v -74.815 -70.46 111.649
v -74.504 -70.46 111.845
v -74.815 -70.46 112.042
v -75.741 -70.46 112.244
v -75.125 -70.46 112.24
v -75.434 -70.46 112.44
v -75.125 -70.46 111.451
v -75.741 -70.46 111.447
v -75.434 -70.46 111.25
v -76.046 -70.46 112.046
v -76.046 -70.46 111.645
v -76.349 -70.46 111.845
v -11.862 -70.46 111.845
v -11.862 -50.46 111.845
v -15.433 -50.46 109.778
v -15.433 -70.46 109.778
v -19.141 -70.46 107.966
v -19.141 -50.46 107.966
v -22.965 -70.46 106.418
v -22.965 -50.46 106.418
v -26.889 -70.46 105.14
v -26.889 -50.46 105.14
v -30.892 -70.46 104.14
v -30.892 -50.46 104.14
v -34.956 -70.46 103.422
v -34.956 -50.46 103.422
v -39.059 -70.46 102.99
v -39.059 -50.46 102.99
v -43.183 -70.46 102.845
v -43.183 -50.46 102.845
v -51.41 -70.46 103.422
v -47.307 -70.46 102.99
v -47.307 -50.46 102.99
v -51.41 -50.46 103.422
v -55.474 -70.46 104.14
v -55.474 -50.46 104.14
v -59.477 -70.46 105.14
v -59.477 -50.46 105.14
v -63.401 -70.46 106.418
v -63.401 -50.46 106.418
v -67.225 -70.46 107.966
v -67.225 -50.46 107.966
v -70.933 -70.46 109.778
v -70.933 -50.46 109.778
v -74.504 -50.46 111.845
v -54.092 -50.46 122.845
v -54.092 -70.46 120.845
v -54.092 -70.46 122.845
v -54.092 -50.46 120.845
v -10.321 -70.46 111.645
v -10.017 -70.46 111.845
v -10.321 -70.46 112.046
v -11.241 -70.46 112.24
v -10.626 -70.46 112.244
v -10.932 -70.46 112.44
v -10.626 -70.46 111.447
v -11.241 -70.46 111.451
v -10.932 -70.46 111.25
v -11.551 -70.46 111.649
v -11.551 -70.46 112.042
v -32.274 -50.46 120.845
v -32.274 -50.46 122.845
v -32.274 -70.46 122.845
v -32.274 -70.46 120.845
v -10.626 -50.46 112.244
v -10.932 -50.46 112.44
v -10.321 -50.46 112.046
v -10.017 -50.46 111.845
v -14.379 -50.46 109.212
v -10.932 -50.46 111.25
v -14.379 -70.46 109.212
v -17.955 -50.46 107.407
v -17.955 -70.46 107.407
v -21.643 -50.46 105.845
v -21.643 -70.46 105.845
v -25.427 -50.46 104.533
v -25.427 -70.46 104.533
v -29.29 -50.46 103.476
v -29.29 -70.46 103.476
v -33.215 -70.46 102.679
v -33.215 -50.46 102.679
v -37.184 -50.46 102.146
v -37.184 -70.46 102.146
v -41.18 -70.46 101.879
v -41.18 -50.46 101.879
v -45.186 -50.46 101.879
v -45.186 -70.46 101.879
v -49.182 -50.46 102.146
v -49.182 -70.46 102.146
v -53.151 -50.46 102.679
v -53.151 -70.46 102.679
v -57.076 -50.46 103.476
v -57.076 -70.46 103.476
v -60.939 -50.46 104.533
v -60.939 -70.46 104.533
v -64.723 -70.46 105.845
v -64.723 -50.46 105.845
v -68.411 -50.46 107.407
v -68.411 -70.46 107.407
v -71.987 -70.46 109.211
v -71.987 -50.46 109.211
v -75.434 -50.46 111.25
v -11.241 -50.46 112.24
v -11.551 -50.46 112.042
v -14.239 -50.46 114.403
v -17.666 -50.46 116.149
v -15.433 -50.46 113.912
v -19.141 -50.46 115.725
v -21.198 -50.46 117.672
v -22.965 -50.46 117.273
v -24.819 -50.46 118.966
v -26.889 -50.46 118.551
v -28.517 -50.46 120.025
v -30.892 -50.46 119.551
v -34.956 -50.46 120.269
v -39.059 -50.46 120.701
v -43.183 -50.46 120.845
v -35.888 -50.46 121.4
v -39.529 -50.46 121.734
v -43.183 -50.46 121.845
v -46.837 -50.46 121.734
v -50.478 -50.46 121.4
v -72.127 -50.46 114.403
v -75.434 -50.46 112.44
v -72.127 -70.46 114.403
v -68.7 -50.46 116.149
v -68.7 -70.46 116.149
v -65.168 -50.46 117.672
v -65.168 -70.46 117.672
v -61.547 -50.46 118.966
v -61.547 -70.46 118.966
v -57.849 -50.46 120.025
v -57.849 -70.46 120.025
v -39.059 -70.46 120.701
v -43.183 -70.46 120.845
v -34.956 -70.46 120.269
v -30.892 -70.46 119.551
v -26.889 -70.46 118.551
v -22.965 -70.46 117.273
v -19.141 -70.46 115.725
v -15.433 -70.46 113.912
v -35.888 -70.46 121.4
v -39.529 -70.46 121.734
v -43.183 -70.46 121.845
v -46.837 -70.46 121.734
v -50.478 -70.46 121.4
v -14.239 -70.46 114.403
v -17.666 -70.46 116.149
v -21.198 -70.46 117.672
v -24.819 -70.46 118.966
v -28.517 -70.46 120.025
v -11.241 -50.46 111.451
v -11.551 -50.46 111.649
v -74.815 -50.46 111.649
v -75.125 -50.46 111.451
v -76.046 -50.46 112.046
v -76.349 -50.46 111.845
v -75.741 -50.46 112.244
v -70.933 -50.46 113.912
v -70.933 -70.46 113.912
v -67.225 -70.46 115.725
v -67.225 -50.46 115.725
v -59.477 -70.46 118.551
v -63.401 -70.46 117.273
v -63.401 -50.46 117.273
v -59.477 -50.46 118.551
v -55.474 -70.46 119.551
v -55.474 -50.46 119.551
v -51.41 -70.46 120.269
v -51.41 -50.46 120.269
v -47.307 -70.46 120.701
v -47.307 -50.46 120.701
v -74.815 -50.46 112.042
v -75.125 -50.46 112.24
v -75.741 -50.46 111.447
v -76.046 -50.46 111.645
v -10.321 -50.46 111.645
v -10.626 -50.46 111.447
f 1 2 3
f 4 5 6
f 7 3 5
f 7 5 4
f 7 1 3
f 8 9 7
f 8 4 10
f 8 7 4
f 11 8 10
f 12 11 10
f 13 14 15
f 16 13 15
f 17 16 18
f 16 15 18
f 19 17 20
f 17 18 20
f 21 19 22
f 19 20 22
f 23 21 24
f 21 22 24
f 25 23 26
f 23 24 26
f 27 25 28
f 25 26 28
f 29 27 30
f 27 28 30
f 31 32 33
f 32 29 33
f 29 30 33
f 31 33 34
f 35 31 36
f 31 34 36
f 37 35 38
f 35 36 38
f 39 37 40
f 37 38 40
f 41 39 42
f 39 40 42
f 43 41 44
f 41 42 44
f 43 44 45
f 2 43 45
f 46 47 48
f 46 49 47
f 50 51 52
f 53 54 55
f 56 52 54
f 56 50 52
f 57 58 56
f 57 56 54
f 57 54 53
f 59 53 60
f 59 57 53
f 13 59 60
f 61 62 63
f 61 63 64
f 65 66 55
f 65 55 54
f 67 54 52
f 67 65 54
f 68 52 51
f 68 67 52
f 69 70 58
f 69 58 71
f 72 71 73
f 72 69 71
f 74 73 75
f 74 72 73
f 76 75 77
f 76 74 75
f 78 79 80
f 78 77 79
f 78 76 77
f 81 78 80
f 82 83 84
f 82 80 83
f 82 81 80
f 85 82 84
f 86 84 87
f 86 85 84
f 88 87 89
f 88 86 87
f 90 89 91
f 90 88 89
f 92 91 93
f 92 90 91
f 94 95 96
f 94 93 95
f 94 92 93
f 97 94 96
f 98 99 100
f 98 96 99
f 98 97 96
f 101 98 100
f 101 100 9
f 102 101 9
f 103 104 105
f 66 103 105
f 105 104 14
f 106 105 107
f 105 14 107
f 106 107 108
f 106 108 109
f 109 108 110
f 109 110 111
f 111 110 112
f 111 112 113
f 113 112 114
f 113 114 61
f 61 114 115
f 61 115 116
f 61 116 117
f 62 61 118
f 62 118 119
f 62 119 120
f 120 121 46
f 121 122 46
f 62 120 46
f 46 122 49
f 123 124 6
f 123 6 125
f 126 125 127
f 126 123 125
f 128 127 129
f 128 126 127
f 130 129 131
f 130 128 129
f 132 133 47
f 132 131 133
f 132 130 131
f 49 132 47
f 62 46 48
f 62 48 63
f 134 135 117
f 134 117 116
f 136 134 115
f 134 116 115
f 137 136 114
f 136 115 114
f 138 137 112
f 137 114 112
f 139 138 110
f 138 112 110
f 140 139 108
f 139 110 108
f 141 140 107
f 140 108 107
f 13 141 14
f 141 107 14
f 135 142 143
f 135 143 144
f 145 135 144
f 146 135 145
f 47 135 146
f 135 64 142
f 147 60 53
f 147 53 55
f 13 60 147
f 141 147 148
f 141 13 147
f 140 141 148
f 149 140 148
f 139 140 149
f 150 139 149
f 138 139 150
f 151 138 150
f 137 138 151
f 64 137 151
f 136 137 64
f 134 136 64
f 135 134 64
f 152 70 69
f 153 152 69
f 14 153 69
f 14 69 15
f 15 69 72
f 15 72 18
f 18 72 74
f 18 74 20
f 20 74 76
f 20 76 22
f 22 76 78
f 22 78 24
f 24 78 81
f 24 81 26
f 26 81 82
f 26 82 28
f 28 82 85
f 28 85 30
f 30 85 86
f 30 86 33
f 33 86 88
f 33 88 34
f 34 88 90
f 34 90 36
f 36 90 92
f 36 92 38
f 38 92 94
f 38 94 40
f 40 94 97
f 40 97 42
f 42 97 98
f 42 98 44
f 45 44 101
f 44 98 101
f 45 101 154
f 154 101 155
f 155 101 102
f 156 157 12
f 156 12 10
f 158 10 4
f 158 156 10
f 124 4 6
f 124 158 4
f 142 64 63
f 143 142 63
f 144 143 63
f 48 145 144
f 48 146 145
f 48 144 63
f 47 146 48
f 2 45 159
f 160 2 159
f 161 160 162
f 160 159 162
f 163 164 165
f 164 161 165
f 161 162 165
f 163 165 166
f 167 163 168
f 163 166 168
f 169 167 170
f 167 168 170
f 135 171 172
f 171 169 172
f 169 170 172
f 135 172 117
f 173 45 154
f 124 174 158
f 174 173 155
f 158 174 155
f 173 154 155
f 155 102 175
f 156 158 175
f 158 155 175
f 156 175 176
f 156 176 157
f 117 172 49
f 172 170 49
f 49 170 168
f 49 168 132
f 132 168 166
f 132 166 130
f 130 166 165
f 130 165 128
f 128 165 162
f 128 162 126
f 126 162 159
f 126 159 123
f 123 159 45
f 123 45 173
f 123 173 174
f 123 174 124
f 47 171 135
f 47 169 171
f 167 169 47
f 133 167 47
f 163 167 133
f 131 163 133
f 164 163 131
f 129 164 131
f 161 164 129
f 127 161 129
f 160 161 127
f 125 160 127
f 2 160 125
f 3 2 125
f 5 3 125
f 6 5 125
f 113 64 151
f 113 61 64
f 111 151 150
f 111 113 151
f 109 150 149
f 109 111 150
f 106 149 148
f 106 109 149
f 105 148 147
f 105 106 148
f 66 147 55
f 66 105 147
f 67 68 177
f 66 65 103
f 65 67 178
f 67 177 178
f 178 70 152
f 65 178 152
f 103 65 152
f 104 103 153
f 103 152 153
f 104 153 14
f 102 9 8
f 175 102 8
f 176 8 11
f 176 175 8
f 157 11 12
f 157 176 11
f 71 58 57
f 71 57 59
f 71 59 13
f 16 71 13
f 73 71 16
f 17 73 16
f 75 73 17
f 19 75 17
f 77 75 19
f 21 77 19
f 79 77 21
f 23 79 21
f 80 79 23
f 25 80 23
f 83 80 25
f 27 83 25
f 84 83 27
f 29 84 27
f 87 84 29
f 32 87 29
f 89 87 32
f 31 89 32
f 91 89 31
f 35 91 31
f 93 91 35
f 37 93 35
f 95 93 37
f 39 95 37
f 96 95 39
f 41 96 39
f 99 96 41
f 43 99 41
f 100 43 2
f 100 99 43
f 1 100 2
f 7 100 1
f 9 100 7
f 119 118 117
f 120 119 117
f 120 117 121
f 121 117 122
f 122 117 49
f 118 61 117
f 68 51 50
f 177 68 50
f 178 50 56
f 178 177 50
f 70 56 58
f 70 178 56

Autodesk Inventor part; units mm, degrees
ref_plane "YZ Plane" through (0, 0, 0) normal (1, 0, 0) x (0, 1, 0)
ref_plane "XZ Plane" through (0, 0, 0) normal (0, 1, 0) x (-1, 0, 0)
ref_plane "XY Plane" through (0, 0, 0) normal (0, 0, 1) x (1, 0, 0)
ref_plane "Arbeitsebene1" through (-23.7843, -50.4597, 67.3862) normal (0, -1, 0) x (-1, 0, 0)
sketch "Skizze1" plane through (-23.7843, -50.4597, 67.3862) normal (0, -1, 0) x (-1, 0, 0)
  arc A0 (-13.7675, -44.4592) -> (52.565, -44.4592) centre (19.3987, 5.5408) ccw
  arc A1 (52.565, -44.4592) -> (-13.7675, -44.4592) centre (19.3987, -94.4592) ccw
  arc A2 (-12.8526, -43.8642) -> (51.65, -43.8642) centre (19.3987, 5.5408) ccw
  arc A3 (51.65, -45.0542) -> (-12.8526, -45.0542) centre (19.3987, -94.4592) ccw
  line L0 (30.3074, -55.4592) -> (8.49, -55.4592)
  line L1 (8.49, -55.4592) -> (8.49, -53.4592)
  line L2 (8.49, -53.4592) -> (30.3074, -53.4592)
  line L3 (30.3074, -53.4592) -> (30.3074, -55.4592)
  line L4 (30.3074, -55.4592) -> (8.49, -53.4592) construction
  line L5 (8.49, -55.4592) -> (30.3074, -53.4592) construction
  point P0 (-23.7843, 67.3862)
  point P1 (50.7196, -44.4592)
  point P2 (-11.9222, -44.4592)
  point P3 (19.3987, -54.4592)
  dimension "d0" = 120
  dimension "d1" = 120
  dimension "d2" = 100
  dimension "d3" = 0
  dimension "d4" = 1
  dimension "d5" = 1
extrude "Extrusion1" add sketch "Skizze1" along normal blind 20 contours A1 A2 A3 A0 | A3 A2 L2 A0 | A1 A2 A3 | L2 A0 | A0 L3 L0 L1 | A1 A0 A3 A2 | L2 A2 A3 A0
properties part number "07_Feder"
